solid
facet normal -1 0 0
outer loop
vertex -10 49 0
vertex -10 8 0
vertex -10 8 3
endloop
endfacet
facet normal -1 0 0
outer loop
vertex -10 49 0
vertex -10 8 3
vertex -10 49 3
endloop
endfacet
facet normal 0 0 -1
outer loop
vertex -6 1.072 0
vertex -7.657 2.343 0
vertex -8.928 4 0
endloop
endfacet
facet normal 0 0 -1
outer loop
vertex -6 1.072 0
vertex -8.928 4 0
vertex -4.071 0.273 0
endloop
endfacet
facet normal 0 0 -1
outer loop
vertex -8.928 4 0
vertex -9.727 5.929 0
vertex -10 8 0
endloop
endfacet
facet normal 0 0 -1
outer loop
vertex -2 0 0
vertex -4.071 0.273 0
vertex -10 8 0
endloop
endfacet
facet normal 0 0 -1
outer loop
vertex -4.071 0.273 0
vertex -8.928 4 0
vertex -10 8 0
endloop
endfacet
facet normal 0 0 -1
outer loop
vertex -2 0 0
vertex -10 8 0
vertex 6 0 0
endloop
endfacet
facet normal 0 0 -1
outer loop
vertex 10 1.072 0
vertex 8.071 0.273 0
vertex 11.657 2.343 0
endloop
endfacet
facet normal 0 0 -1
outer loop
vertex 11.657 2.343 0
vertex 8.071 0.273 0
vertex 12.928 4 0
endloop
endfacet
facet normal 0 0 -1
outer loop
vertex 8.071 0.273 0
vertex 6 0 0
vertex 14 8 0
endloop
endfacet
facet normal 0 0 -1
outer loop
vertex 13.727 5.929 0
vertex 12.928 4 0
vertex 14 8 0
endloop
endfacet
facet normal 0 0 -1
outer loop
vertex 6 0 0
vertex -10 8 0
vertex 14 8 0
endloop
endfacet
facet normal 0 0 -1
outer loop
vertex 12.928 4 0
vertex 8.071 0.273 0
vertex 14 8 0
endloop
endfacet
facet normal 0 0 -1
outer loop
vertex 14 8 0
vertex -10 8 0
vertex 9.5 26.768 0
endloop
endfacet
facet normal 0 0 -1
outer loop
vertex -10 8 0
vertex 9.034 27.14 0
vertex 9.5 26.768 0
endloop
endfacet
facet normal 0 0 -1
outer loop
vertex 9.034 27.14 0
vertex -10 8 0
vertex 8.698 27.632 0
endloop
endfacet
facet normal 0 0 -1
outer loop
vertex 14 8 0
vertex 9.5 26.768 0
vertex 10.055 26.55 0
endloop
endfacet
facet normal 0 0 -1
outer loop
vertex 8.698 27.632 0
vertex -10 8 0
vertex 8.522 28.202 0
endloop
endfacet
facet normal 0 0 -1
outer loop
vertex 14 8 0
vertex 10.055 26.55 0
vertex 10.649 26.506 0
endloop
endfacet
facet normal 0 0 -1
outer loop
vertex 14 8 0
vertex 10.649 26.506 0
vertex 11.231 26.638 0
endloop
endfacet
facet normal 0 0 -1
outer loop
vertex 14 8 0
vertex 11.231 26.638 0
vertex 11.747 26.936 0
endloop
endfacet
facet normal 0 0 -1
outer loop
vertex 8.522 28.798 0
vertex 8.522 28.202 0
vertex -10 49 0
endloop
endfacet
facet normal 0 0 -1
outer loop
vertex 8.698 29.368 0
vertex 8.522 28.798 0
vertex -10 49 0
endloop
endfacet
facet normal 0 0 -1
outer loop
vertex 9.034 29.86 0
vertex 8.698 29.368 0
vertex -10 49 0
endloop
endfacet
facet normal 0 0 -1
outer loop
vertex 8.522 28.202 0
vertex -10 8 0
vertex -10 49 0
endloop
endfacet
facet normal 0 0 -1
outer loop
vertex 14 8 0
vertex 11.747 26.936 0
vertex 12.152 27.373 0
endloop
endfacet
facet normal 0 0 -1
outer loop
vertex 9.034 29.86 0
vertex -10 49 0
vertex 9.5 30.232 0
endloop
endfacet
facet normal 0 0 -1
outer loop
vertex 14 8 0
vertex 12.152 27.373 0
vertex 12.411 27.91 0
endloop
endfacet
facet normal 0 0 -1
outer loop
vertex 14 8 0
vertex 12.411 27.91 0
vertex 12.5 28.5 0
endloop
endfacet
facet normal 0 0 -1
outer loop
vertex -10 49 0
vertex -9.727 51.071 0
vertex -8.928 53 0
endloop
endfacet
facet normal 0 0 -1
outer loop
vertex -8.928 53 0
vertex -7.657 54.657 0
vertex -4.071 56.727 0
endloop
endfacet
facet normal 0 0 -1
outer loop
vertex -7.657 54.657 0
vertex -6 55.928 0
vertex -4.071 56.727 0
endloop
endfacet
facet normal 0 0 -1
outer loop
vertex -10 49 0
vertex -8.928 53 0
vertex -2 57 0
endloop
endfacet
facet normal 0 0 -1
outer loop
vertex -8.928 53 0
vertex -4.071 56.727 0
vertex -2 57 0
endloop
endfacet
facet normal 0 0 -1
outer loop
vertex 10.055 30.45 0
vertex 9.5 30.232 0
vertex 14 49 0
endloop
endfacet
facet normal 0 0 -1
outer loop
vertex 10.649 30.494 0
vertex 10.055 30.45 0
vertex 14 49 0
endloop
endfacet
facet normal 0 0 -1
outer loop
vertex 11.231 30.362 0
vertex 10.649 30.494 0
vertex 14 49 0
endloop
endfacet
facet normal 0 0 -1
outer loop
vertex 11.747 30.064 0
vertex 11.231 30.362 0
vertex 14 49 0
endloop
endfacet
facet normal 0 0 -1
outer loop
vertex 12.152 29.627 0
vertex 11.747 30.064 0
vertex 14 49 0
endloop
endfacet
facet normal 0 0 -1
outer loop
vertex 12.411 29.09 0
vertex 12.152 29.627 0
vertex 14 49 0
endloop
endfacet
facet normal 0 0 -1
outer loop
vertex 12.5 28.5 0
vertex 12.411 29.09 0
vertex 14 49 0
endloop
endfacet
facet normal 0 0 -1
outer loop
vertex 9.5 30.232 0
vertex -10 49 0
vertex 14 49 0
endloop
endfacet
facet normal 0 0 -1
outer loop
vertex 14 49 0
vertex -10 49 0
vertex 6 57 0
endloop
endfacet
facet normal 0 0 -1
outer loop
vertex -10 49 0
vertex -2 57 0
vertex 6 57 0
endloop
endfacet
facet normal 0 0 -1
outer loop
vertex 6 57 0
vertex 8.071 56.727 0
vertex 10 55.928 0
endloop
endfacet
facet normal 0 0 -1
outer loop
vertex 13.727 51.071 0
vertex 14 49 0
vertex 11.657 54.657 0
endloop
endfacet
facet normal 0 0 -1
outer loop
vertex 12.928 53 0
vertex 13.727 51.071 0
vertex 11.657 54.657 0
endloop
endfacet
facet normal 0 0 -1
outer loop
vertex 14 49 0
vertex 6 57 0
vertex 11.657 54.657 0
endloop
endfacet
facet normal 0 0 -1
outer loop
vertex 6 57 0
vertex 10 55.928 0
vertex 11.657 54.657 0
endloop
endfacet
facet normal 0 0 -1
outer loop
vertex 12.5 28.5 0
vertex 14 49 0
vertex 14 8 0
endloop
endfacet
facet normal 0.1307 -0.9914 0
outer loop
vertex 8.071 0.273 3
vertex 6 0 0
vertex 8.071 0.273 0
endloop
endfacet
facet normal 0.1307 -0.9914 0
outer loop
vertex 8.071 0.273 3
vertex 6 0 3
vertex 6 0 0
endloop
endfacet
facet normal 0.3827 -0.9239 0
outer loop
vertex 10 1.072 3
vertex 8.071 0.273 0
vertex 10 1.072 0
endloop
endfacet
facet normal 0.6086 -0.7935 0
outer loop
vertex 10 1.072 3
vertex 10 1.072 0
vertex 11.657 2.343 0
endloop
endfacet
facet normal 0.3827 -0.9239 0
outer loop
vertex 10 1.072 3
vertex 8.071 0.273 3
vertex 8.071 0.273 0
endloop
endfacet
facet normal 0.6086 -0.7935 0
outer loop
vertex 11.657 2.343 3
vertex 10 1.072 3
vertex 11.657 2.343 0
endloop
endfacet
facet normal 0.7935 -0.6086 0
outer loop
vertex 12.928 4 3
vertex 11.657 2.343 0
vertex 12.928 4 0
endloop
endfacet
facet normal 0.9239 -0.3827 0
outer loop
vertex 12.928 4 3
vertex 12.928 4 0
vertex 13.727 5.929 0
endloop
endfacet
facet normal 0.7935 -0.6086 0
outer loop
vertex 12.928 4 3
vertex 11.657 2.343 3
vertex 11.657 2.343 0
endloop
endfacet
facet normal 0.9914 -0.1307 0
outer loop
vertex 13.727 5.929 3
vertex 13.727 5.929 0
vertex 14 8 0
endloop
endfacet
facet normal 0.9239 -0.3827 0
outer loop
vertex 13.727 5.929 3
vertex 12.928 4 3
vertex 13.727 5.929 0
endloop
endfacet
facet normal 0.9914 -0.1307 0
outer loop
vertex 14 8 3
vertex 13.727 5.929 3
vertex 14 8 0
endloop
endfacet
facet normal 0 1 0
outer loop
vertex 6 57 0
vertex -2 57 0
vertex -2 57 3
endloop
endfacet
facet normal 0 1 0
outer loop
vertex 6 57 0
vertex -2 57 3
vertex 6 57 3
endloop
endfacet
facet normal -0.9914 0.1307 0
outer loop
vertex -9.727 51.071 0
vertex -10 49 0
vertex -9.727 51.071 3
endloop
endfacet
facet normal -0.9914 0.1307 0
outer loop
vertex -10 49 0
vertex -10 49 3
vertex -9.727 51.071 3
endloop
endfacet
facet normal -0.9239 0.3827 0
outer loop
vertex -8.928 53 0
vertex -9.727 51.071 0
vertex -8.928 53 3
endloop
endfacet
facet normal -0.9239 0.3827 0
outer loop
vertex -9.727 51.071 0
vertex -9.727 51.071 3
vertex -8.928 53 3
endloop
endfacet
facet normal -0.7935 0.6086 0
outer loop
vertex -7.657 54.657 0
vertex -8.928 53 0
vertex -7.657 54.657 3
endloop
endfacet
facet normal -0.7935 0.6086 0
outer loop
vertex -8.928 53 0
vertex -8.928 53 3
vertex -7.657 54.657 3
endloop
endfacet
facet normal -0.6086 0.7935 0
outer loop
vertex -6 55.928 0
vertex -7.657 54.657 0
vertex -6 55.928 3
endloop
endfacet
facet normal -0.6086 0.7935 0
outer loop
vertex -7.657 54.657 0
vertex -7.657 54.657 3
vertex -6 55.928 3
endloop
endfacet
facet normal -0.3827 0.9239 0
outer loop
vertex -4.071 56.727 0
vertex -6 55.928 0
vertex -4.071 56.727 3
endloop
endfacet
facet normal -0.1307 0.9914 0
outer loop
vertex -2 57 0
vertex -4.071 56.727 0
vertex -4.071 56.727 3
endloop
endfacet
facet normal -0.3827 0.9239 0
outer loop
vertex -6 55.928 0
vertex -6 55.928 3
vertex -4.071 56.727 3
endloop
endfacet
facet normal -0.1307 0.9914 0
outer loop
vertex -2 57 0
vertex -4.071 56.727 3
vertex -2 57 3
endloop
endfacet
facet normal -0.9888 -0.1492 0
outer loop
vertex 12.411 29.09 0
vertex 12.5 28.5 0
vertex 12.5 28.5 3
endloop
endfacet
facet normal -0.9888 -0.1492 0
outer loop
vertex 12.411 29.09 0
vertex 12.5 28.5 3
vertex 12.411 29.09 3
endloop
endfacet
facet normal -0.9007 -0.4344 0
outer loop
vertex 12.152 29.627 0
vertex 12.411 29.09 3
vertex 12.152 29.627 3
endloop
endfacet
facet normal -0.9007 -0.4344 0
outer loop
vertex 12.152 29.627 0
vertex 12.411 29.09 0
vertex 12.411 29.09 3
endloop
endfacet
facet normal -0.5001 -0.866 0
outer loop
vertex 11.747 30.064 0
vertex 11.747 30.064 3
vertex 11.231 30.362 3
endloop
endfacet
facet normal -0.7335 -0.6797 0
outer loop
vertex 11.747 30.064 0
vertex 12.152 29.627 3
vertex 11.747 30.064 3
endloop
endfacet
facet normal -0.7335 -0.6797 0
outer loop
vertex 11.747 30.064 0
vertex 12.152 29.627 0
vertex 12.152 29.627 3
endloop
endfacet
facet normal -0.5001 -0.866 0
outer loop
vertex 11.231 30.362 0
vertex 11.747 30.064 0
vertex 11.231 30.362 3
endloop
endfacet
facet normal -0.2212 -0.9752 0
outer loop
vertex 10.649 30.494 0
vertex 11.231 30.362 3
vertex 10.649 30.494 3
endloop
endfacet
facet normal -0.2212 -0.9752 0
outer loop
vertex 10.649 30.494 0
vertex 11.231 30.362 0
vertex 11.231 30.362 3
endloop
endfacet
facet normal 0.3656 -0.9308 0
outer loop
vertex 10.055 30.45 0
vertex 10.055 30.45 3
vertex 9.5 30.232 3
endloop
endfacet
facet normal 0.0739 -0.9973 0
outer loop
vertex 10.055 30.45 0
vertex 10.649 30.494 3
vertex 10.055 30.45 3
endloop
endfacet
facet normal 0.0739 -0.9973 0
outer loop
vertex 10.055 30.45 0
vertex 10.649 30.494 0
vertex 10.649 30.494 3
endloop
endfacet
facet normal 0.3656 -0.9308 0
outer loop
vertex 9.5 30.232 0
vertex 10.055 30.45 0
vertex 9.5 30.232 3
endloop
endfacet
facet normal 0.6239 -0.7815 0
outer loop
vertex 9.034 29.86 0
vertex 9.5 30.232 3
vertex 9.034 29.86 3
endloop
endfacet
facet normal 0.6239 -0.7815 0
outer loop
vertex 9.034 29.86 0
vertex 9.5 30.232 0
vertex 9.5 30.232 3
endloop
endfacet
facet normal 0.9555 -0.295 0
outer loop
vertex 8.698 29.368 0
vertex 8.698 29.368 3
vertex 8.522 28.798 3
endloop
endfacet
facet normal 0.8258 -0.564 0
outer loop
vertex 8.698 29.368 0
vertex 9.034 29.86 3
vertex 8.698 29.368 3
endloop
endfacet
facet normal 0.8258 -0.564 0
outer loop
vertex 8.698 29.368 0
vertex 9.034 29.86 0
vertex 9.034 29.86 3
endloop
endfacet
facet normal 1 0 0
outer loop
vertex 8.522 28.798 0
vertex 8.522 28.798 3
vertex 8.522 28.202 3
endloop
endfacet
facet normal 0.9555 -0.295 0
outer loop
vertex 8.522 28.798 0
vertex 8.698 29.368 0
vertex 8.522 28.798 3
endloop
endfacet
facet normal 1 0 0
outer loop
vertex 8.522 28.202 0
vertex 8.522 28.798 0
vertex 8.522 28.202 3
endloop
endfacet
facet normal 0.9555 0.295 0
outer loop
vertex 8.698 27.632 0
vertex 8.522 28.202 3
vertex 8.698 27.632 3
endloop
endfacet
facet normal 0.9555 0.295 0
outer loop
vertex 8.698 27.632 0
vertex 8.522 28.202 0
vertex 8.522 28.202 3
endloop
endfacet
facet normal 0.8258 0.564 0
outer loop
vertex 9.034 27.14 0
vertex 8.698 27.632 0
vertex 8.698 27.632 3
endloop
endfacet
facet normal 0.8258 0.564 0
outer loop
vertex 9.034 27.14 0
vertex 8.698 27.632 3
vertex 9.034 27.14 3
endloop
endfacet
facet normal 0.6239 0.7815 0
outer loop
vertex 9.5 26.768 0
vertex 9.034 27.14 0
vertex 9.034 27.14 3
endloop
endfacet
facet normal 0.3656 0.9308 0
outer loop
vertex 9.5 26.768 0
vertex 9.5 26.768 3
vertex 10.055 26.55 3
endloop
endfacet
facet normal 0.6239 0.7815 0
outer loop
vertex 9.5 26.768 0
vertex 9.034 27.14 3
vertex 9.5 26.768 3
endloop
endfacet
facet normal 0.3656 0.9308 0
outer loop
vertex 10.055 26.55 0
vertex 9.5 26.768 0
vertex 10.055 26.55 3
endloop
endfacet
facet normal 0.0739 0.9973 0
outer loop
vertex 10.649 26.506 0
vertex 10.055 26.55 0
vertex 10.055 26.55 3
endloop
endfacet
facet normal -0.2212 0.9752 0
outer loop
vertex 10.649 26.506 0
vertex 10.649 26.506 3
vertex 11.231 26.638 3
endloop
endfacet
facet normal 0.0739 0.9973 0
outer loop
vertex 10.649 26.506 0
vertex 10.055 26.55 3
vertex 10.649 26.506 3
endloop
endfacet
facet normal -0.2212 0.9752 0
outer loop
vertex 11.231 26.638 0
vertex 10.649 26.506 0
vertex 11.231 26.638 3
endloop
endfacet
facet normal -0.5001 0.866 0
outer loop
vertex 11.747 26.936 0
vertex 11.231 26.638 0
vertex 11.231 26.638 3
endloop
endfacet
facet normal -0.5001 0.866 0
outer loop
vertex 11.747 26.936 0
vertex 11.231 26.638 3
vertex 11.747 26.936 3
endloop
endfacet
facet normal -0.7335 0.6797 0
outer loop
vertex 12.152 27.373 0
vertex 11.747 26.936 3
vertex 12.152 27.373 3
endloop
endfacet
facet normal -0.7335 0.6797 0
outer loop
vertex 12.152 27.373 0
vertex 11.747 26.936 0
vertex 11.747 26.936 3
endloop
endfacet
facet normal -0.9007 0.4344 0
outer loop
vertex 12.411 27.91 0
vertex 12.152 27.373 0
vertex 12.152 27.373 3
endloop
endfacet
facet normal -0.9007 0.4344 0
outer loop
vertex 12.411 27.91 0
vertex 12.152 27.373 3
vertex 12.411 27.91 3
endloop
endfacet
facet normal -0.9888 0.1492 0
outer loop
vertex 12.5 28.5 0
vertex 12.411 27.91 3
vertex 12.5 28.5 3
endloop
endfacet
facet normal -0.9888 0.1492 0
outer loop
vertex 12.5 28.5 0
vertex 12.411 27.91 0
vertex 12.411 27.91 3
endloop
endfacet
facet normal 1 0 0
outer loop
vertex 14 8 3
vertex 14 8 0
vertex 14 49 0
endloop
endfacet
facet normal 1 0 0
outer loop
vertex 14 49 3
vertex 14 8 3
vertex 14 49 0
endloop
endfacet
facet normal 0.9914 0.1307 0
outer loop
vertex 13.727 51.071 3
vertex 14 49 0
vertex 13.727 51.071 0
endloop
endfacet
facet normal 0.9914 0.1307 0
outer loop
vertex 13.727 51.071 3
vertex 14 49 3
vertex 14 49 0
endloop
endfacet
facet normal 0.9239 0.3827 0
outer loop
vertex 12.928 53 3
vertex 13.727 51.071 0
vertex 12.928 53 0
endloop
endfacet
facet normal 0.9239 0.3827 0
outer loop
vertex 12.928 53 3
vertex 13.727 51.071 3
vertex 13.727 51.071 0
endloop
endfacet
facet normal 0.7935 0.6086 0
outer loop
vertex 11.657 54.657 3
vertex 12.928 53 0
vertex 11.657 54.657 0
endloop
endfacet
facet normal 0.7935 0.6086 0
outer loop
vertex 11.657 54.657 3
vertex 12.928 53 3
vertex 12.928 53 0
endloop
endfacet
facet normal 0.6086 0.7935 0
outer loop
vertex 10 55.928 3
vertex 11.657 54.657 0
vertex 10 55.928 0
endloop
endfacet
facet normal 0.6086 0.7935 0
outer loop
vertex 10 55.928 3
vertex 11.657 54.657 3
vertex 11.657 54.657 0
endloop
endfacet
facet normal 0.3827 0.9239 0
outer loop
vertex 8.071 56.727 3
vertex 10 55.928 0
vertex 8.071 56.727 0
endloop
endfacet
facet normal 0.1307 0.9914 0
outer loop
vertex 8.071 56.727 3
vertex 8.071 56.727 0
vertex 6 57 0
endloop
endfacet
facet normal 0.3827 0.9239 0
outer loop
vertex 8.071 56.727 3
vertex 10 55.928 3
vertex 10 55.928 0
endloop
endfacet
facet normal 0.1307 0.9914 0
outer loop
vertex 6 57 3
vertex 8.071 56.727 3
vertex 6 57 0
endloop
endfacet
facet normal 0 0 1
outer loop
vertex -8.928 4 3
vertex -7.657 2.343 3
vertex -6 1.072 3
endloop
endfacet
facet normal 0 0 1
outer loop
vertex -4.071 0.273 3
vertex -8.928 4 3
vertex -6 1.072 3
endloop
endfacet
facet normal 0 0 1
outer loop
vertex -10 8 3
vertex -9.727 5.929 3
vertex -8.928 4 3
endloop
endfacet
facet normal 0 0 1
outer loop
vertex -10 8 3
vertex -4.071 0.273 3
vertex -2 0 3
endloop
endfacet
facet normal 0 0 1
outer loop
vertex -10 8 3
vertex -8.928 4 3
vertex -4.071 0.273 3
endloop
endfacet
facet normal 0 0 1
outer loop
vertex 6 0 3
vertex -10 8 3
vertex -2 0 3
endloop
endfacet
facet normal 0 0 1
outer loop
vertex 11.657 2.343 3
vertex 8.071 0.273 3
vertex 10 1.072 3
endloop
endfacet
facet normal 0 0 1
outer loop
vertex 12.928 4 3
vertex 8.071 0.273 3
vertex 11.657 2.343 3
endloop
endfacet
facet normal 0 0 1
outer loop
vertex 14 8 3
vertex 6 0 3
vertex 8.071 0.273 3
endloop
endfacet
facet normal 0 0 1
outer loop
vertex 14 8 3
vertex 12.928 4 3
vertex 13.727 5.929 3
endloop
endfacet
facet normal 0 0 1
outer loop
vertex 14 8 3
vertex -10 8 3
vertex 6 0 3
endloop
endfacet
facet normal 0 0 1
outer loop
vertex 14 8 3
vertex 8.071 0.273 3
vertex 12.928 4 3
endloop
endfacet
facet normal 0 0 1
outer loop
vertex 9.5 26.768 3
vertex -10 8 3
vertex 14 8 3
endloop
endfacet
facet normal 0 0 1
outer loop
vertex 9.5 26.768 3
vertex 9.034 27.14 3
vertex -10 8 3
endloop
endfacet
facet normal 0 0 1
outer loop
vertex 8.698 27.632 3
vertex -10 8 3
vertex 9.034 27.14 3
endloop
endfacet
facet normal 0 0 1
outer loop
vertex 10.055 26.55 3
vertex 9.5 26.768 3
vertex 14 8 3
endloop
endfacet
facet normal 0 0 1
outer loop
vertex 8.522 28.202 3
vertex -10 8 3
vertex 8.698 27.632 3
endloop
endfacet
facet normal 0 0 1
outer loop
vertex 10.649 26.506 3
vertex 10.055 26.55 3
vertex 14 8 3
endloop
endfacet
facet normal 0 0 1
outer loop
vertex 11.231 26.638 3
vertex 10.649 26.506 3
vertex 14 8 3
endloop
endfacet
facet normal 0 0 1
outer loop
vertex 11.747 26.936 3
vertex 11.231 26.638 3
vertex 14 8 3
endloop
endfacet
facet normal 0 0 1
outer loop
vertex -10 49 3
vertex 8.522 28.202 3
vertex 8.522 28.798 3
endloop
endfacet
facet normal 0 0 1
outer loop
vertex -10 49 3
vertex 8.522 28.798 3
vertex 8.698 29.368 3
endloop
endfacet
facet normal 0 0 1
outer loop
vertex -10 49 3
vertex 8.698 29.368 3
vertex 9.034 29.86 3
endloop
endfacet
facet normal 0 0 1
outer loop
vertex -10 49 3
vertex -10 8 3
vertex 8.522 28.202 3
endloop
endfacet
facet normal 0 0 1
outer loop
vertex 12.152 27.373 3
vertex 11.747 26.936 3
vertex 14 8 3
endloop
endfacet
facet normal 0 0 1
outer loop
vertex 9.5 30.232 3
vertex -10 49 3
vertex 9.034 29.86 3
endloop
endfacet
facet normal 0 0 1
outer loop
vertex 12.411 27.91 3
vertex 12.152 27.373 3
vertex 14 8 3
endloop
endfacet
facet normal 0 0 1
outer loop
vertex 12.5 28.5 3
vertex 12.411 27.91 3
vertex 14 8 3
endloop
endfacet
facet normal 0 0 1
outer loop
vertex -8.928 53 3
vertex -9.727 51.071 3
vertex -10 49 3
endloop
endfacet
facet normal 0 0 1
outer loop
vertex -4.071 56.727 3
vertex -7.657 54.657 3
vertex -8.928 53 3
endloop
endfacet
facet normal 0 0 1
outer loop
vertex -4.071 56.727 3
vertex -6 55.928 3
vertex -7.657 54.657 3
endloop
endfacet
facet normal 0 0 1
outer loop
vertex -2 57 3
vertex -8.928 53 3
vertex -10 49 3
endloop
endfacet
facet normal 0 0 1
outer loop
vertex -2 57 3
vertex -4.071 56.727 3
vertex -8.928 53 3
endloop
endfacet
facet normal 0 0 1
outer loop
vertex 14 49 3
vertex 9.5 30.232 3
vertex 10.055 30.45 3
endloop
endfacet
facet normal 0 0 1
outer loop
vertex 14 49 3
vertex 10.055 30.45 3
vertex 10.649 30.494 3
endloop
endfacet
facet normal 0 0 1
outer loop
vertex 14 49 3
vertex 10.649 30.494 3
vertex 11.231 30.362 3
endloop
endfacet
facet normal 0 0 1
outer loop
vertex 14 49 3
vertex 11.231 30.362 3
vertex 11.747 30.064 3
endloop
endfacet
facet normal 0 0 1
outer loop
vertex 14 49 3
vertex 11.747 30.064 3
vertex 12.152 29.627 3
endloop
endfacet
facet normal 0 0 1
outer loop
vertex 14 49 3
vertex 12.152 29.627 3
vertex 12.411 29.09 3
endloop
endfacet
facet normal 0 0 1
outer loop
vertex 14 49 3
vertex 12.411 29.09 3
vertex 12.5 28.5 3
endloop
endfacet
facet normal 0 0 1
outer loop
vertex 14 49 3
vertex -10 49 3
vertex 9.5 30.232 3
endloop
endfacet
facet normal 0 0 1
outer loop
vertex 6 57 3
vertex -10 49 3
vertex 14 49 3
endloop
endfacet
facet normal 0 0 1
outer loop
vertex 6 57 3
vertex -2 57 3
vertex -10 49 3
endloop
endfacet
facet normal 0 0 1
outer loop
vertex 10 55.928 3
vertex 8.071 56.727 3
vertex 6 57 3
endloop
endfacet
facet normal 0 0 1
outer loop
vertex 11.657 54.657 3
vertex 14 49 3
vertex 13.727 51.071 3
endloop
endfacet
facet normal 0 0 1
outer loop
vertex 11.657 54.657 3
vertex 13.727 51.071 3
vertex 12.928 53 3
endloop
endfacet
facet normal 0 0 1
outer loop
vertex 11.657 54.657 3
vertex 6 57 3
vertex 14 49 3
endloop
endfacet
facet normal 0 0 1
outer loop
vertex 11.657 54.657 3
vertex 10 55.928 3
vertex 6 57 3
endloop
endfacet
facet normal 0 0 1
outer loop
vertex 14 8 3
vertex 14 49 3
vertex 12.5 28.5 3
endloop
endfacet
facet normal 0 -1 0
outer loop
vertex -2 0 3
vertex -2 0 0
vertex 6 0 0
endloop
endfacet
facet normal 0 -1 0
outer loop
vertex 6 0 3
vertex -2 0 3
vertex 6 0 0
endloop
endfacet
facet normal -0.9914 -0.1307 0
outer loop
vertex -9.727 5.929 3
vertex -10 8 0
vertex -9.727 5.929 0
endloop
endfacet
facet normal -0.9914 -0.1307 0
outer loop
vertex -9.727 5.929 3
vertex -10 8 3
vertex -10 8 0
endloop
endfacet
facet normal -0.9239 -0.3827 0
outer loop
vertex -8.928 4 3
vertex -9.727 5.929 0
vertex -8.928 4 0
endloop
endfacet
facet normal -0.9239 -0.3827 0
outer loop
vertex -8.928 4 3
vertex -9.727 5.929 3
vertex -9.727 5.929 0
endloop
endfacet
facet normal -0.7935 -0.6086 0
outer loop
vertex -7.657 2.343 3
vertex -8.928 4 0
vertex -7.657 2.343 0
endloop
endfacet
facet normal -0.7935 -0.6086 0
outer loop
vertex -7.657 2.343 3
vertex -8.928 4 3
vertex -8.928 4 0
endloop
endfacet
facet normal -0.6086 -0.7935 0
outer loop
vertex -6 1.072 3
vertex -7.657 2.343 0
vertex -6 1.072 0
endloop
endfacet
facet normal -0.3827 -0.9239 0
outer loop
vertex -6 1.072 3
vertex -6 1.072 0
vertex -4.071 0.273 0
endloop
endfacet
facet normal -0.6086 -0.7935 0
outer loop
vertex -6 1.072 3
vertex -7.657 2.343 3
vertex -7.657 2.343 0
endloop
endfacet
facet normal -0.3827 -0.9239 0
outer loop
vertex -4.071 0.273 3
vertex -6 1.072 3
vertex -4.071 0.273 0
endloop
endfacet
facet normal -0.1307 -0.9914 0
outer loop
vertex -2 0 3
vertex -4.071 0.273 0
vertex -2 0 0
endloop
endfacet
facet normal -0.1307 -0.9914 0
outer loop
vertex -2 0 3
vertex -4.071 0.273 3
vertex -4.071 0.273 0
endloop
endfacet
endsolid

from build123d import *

# Parameters (mm, degrees)
CYLINDER002_R     = 2
CYLINDER002_DEPTH = 10
BOX005_W          = 24
BOX005_H          = 57
BOX005_DEPTH      = 3
FILLET_R          = 8


with BuildPart() as central_bottom_hole:
    # Cylinder002 → Cylinder002 (new body)
    with BuildSketch(Plane(origin=(10.5, 28.5, -4), x_dir=(1, 0, 0), z_dir=(0, 0, 1))):
        Circle(CYLINDER002_R)
    extrude(amount=CYLINDER002_DEPTH)


with BuildPart() as bottom_cut:
    # Box005 → Box005 (new body)
    with BuildSketch(Plane(origin=(-10, 0, 0), x_dir=(1, 0, 0), z_dir=(0, 0, 1))):
        with Locations((12, 28.5)):
            Rectangle(BOX005_W, BOX005_H)
    extrude(amount=BOX005_DEPTH)

    # Fillet
    fillet_edges = [bottom_cut.edges().sort_by_distance(p)[0] for p in [
        (-10, 0, 1.5),
        (-10, 57, 1.5),
        (14, 0, 1.5),
        (14, 57, 1.5),
    ]]
    fillet(fillet_edges, radius=FILLET_R)

    # Cut003: cut central bottom hole
    add(central_bottom_hole.part, mode=Mode.SUBTRACT)


solid = bottom_cut.part
